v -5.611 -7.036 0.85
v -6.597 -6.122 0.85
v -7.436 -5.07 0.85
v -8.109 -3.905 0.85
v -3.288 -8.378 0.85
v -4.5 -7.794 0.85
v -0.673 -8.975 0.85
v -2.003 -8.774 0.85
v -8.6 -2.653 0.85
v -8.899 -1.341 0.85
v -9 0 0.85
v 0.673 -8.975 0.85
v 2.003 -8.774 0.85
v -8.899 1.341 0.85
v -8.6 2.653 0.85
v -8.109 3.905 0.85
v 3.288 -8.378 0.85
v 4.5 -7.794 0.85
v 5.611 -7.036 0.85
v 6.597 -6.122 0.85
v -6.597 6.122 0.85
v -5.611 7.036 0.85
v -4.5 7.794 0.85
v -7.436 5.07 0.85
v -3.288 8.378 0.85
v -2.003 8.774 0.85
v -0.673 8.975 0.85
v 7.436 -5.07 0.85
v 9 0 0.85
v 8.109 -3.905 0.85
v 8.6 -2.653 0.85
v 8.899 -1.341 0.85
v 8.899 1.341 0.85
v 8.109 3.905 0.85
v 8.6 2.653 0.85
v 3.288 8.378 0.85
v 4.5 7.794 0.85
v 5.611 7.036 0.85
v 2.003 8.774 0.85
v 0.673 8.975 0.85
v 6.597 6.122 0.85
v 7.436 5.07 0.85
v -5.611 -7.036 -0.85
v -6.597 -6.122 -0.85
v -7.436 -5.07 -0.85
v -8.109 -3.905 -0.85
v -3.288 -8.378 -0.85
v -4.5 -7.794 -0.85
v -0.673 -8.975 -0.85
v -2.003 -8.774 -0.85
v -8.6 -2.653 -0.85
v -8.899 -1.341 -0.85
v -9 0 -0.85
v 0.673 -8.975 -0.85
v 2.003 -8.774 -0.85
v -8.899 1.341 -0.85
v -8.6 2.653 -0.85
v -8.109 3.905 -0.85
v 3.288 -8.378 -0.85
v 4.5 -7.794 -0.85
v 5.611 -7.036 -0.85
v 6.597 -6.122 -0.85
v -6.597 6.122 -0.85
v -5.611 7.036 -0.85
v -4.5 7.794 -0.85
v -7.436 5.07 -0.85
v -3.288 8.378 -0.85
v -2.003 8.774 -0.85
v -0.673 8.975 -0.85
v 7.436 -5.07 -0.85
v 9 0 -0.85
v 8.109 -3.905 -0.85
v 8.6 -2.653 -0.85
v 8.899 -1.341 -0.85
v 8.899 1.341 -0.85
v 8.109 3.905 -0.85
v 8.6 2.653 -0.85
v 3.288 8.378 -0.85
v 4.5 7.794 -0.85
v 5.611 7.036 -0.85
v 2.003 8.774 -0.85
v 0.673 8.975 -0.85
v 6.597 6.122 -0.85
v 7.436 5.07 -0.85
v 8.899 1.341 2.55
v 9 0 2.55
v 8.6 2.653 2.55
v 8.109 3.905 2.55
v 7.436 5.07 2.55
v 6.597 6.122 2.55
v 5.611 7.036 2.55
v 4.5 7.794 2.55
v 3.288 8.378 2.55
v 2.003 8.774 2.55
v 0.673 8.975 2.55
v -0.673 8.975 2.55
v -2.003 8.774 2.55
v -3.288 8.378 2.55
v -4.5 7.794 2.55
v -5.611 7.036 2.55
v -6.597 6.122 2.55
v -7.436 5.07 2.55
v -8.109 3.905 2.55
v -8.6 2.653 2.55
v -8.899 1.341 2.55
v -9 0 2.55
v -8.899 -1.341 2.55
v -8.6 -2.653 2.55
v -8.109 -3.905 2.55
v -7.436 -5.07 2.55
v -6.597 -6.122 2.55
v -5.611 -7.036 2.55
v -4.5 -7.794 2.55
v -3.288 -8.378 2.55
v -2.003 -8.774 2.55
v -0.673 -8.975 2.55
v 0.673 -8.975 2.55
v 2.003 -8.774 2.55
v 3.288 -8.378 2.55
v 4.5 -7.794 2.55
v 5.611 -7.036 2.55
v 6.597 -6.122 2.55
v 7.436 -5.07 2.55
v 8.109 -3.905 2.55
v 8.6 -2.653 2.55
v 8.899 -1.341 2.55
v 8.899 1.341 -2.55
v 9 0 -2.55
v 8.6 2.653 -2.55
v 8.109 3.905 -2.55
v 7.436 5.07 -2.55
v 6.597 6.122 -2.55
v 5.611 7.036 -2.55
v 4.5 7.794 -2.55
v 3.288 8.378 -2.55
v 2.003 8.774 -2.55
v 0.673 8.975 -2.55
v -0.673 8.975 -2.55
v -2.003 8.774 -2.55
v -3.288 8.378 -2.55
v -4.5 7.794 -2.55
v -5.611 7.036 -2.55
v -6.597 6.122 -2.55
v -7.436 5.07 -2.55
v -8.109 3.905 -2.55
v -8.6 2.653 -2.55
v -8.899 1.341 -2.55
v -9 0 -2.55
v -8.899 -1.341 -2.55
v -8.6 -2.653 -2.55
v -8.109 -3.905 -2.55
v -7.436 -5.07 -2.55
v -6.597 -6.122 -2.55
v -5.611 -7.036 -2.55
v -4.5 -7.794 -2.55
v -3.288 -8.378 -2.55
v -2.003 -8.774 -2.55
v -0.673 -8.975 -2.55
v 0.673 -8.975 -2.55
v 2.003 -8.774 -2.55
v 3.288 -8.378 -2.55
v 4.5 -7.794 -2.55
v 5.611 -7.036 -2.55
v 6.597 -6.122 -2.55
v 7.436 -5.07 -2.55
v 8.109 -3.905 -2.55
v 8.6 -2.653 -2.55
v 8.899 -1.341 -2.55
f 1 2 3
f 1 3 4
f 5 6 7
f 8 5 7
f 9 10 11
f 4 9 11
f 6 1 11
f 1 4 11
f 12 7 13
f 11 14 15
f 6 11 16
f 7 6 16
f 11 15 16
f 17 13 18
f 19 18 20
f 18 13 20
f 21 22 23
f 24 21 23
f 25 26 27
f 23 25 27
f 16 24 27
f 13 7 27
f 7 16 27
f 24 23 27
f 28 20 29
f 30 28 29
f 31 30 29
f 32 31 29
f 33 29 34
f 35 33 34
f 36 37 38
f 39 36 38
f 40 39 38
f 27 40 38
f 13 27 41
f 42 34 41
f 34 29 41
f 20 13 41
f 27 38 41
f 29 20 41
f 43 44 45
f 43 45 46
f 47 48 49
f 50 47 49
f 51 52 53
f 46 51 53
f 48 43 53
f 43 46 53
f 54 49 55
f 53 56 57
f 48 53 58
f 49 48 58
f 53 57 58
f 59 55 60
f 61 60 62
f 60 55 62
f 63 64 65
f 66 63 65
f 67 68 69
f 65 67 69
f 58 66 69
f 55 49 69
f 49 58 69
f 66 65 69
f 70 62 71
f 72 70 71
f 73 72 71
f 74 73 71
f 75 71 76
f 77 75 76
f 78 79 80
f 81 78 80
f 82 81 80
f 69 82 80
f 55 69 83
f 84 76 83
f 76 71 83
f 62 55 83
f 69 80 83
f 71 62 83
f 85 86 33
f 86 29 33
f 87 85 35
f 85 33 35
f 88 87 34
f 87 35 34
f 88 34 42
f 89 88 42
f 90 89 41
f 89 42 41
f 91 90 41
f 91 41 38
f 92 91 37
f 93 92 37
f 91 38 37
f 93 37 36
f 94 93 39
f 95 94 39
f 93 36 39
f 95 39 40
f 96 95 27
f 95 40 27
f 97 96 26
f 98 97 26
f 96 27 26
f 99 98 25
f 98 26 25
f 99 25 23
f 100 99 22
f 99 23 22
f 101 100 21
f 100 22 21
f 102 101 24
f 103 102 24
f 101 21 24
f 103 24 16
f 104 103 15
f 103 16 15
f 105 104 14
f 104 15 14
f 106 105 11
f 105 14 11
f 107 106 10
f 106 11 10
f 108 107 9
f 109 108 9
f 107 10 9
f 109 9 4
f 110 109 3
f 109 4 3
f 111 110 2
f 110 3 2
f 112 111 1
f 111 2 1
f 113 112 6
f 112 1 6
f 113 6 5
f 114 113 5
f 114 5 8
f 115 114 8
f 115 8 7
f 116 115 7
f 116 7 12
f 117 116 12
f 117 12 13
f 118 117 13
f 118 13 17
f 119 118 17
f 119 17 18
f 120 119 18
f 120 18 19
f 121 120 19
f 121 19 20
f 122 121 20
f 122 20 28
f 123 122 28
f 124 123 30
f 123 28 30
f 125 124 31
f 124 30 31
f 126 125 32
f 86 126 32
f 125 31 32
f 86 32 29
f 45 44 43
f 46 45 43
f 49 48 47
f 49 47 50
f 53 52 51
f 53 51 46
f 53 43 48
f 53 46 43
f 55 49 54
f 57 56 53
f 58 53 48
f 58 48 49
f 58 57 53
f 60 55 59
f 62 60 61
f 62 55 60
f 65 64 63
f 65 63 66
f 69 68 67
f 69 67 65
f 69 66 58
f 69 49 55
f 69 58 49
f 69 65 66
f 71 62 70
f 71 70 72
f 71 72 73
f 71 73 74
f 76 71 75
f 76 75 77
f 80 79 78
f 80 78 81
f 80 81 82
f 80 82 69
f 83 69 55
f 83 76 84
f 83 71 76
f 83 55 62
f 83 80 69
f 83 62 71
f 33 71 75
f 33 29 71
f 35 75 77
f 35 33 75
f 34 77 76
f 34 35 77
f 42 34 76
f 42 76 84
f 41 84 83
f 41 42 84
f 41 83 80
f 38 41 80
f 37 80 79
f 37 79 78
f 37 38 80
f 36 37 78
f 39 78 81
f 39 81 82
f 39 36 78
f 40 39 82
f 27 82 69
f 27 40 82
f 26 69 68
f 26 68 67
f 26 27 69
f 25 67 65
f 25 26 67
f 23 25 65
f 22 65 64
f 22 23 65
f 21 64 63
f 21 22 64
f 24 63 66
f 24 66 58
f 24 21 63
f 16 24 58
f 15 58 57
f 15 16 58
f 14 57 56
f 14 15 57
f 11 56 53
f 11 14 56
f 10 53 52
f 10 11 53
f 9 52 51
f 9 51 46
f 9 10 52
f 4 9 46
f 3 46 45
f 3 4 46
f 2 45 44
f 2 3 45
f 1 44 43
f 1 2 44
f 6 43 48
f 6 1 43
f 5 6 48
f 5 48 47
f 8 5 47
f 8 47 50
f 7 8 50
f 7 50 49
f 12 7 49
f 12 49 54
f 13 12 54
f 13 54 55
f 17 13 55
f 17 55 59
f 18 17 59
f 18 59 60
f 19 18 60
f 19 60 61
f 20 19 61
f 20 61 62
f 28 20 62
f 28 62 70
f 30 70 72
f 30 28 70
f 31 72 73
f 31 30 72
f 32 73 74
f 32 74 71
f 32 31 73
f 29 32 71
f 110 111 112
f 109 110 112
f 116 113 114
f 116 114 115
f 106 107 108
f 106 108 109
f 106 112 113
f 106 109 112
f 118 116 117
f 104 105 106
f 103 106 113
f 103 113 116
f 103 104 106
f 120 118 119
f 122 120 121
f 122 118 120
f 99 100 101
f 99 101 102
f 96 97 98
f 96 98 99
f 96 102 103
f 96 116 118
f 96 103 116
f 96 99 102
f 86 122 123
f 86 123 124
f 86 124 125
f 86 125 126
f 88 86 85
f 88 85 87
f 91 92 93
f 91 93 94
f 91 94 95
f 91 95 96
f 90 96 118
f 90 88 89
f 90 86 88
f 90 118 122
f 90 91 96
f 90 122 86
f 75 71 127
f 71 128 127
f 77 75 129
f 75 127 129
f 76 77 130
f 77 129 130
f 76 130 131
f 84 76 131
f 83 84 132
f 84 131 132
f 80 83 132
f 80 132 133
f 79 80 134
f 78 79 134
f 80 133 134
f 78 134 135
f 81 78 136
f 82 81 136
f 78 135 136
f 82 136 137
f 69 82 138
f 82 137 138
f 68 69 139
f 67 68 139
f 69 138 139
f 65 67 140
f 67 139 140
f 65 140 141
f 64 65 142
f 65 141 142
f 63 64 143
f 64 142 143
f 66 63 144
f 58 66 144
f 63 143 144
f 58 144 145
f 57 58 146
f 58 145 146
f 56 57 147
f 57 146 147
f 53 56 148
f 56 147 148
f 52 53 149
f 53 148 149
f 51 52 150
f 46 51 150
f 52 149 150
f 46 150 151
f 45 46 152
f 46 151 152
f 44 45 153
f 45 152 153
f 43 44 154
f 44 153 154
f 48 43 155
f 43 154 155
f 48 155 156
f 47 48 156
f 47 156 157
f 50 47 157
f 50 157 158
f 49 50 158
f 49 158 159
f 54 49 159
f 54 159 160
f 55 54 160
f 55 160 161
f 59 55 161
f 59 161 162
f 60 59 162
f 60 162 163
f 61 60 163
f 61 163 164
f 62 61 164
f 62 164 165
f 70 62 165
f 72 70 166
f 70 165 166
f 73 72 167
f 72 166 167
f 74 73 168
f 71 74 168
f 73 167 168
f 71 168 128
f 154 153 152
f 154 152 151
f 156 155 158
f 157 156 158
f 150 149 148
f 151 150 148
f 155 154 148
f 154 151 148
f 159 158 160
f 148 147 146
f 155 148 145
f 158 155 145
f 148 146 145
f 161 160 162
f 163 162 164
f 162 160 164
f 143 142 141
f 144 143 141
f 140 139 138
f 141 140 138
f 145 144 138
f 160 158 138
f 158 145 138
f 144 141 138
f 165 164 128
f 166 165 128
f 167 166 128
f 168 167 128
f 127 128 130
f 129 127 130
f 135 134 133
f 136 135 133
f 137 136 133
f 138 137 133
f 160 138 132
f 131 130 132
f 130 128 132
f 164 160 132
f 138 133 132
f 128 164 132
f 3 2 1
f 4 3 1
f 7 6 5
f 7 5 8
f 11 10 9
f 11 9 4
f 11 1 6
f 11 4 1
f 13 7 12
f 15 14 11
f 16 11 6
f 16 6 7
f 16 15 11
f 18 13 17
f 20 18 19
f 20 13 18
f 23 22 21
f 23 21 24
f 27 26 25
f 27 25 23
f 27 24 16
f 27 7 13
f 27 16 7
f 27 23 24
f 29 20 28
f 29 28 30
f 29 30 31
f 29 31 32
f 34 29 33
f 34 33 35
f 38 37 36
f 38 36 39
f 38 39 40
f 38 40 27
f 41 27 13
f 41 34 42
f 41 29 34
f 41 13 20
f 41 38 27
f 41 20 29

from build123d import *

# Parameters (mm, degrees)
F0_R     = 9
F1_DEPTH = 0.85


with BuildPart() as f1:
    # F0 (on Top) → F1 (new body, symmetric)
    with BuildSketch(Plane.XY):
        Circle(F0_R)
    extrude(amount=F1_DEPTH, both=True)


with BuildPart() as f2_1:
    # F2: instance of F1
    add(f1.part.mirror(Plane.XY.offset(0.85)))


with BuildPart() as f3_1:
    # F3: instance of F1
    add(f1.part.mirror(Plane(origin=(0, 0, -0.85), x_dir=(1, 0, 0), z_dir=(0, 0, -1))))


solid = Compound([f1.part, f2_1.part, f3_1.part])
